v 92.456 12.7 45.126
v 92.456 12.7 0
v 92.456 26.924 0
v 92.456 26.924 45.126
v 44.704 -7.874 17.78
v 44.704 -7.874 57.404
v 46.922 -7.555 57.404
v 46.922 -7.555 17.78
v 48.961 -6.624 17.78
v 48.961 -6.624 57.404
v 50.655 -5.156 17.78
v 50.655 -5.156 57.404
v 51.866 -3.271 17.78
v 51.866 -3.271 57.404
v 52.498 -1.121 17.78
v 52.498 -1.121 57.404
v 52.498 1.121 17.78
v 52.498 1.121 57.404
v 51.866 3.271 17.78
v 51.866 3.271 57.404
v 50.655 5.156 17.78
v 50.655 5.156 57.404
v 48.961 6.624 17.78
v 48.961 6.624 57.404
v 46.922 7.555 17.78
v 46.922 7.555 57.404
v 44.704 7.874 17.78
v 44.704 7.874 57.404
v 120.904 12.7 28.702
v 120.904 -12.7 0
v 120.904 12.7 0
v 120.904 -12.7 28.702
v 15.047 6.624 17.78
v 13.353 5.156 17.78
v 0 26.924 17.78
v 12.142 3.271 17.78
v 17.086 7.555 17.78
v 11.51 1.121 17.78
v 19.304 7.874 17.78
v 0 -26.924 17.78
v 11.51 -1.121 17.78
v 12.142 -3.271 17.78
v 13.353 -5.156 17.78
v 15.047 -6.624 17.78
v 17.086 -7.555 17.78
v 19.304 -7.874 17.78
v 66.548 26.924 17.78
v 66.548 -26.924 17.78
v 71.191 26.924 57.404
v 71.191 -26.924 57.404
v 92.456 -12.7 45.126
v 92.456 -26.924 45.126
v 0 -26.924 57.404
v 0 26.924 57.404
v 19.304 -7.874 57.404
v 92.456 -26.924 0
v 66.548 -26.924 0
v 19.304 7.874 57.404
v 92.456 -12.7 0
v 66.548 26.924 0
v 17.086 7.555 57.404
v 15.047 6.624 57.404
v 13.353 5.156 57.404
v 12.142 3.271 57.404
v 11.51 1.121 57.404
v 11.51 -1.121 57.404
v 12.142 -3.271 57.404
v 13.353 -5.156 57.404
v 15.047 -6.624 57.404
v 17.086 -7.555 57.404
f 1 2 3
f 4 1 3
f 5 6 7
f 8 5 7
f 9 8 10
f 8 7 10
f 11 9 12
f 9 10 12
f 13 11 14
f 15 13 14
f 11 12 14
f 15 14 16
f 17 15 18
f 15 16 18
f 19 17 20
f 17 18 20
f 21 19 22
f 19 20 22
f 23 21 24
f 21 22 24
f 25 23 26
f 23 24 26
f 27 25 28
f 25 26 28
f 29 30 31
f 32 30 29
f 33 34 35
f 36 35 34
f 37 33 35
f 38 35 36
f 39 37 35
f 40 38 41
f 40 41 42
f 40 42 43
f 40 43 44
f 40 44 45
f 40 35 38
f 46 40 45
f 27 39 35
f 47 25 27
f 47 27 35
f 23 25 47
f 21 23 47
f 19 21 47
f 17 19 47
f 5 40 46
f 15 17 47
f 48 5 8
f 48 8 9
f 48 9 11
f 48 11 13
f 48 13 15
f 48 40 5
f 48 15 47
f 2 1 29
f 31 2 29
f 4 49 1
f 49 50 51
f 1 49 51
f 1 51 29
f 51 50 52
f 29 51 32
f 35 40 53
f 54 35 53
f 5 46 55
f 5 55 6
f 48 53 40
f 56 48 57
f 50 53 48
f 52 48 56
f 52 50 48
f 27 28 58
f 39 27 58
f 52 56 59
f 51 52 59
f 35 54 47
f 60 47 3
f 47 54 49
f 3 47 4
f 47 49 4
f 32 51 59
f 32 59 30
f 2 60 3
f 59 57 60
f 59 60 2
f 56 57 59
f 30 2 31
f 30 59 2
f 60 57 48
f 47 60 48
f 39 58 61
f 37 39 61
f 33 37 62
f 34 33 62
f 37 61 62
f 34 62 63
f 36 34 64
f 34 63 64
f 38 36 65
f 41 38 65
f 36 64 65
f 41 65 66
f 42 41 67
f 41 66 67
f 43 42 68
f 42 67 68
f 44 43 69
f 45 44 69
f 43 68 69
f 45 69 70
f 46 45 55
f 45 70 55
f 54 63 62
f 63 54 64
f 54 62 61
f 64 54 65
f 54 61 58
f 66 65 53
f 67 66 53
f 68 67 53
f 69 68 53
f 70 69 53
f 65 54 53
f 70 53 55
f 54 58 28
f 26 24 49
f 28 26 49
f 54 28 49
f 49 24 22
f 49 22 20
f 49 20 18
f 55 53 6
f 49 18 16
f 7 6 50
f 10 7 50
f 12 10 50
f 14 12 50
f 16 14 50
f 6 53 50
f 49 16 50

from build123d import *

# Parameters (mm, degrees)
F0_W     = 120.904
F0_H     = 57.404
F1_DEPTH = 26.924
F2_W     = 66.548
F2_H     = 17.78
F3_DEPTH = 53.849
F5_DEPTH = 53.849
F6_W     = 28.448
F6_H     = 14.224
F7_DEPTH = 57.405
F9_DEPTH = 57.405


with BuildPart() as f1:
    # F0 (on Front) → F1 (new body, symmetric)
    with BuildSketch(Plane.XZ):
        with Locations((60.452, 28.702)):
            Rectangle(F0_W, F0_H)
    extrude(amount=F1_DEPTH, both=True)

    # F2 (on face) → F3 (cut, through all)
    with BuildSketch(Plane.XZ.offset(26.924)):
        with Locations((33.274, 8.89)):
            Rectangle(F2_W, F2_H)
    extrude(amount=-F3_DEPTH, mode=Mode.SUBTRACT)

    # F4 (on face) → F5 (cut, through all)
    with BuildSketch(Plane.XZ.offset(26.924)):
        Polygon((120.904, 28.702), (120.904, 57.404), (71.190678, 57.404), align=None)
    extrude(amount=-F5_DEPTH, mode=Mode.SUBTRACT)

    # F6 (on face) → F7 (cut, through all)
    with BuildSketch(Plane.XY.offset(57.404)):
        with Locations((106.68, -19.812)):
            Rectangle(F6_W, F6_H)
        with Locations((106.68, 19.812)):
            Rectangle(F6_W, F6_H)
    extrude(amount=-F7_DEPTH, mode=Mode.SUBTRACT)

    # F8 (on face) → F9 (cut, through all)
    with BuildSketch(Plane.XY.offset(57.404)):
        with BuildLine():
            Line((44.704, 7.874), (19.304, 7.874))
            ThreePointArc((19.304, 7.874), (11.43, 0), (19.304, -7.874))
            Line((19.304, -7.874), (44.704, -7.874))
            ThreePointArc((44.704, -7.874), (52.578, 0), (44.704, 7.874))
        make_face()
    extrude(amount=-F9_DEPTH, mode=Mode.SUBTRACT)


solid = f1.part
